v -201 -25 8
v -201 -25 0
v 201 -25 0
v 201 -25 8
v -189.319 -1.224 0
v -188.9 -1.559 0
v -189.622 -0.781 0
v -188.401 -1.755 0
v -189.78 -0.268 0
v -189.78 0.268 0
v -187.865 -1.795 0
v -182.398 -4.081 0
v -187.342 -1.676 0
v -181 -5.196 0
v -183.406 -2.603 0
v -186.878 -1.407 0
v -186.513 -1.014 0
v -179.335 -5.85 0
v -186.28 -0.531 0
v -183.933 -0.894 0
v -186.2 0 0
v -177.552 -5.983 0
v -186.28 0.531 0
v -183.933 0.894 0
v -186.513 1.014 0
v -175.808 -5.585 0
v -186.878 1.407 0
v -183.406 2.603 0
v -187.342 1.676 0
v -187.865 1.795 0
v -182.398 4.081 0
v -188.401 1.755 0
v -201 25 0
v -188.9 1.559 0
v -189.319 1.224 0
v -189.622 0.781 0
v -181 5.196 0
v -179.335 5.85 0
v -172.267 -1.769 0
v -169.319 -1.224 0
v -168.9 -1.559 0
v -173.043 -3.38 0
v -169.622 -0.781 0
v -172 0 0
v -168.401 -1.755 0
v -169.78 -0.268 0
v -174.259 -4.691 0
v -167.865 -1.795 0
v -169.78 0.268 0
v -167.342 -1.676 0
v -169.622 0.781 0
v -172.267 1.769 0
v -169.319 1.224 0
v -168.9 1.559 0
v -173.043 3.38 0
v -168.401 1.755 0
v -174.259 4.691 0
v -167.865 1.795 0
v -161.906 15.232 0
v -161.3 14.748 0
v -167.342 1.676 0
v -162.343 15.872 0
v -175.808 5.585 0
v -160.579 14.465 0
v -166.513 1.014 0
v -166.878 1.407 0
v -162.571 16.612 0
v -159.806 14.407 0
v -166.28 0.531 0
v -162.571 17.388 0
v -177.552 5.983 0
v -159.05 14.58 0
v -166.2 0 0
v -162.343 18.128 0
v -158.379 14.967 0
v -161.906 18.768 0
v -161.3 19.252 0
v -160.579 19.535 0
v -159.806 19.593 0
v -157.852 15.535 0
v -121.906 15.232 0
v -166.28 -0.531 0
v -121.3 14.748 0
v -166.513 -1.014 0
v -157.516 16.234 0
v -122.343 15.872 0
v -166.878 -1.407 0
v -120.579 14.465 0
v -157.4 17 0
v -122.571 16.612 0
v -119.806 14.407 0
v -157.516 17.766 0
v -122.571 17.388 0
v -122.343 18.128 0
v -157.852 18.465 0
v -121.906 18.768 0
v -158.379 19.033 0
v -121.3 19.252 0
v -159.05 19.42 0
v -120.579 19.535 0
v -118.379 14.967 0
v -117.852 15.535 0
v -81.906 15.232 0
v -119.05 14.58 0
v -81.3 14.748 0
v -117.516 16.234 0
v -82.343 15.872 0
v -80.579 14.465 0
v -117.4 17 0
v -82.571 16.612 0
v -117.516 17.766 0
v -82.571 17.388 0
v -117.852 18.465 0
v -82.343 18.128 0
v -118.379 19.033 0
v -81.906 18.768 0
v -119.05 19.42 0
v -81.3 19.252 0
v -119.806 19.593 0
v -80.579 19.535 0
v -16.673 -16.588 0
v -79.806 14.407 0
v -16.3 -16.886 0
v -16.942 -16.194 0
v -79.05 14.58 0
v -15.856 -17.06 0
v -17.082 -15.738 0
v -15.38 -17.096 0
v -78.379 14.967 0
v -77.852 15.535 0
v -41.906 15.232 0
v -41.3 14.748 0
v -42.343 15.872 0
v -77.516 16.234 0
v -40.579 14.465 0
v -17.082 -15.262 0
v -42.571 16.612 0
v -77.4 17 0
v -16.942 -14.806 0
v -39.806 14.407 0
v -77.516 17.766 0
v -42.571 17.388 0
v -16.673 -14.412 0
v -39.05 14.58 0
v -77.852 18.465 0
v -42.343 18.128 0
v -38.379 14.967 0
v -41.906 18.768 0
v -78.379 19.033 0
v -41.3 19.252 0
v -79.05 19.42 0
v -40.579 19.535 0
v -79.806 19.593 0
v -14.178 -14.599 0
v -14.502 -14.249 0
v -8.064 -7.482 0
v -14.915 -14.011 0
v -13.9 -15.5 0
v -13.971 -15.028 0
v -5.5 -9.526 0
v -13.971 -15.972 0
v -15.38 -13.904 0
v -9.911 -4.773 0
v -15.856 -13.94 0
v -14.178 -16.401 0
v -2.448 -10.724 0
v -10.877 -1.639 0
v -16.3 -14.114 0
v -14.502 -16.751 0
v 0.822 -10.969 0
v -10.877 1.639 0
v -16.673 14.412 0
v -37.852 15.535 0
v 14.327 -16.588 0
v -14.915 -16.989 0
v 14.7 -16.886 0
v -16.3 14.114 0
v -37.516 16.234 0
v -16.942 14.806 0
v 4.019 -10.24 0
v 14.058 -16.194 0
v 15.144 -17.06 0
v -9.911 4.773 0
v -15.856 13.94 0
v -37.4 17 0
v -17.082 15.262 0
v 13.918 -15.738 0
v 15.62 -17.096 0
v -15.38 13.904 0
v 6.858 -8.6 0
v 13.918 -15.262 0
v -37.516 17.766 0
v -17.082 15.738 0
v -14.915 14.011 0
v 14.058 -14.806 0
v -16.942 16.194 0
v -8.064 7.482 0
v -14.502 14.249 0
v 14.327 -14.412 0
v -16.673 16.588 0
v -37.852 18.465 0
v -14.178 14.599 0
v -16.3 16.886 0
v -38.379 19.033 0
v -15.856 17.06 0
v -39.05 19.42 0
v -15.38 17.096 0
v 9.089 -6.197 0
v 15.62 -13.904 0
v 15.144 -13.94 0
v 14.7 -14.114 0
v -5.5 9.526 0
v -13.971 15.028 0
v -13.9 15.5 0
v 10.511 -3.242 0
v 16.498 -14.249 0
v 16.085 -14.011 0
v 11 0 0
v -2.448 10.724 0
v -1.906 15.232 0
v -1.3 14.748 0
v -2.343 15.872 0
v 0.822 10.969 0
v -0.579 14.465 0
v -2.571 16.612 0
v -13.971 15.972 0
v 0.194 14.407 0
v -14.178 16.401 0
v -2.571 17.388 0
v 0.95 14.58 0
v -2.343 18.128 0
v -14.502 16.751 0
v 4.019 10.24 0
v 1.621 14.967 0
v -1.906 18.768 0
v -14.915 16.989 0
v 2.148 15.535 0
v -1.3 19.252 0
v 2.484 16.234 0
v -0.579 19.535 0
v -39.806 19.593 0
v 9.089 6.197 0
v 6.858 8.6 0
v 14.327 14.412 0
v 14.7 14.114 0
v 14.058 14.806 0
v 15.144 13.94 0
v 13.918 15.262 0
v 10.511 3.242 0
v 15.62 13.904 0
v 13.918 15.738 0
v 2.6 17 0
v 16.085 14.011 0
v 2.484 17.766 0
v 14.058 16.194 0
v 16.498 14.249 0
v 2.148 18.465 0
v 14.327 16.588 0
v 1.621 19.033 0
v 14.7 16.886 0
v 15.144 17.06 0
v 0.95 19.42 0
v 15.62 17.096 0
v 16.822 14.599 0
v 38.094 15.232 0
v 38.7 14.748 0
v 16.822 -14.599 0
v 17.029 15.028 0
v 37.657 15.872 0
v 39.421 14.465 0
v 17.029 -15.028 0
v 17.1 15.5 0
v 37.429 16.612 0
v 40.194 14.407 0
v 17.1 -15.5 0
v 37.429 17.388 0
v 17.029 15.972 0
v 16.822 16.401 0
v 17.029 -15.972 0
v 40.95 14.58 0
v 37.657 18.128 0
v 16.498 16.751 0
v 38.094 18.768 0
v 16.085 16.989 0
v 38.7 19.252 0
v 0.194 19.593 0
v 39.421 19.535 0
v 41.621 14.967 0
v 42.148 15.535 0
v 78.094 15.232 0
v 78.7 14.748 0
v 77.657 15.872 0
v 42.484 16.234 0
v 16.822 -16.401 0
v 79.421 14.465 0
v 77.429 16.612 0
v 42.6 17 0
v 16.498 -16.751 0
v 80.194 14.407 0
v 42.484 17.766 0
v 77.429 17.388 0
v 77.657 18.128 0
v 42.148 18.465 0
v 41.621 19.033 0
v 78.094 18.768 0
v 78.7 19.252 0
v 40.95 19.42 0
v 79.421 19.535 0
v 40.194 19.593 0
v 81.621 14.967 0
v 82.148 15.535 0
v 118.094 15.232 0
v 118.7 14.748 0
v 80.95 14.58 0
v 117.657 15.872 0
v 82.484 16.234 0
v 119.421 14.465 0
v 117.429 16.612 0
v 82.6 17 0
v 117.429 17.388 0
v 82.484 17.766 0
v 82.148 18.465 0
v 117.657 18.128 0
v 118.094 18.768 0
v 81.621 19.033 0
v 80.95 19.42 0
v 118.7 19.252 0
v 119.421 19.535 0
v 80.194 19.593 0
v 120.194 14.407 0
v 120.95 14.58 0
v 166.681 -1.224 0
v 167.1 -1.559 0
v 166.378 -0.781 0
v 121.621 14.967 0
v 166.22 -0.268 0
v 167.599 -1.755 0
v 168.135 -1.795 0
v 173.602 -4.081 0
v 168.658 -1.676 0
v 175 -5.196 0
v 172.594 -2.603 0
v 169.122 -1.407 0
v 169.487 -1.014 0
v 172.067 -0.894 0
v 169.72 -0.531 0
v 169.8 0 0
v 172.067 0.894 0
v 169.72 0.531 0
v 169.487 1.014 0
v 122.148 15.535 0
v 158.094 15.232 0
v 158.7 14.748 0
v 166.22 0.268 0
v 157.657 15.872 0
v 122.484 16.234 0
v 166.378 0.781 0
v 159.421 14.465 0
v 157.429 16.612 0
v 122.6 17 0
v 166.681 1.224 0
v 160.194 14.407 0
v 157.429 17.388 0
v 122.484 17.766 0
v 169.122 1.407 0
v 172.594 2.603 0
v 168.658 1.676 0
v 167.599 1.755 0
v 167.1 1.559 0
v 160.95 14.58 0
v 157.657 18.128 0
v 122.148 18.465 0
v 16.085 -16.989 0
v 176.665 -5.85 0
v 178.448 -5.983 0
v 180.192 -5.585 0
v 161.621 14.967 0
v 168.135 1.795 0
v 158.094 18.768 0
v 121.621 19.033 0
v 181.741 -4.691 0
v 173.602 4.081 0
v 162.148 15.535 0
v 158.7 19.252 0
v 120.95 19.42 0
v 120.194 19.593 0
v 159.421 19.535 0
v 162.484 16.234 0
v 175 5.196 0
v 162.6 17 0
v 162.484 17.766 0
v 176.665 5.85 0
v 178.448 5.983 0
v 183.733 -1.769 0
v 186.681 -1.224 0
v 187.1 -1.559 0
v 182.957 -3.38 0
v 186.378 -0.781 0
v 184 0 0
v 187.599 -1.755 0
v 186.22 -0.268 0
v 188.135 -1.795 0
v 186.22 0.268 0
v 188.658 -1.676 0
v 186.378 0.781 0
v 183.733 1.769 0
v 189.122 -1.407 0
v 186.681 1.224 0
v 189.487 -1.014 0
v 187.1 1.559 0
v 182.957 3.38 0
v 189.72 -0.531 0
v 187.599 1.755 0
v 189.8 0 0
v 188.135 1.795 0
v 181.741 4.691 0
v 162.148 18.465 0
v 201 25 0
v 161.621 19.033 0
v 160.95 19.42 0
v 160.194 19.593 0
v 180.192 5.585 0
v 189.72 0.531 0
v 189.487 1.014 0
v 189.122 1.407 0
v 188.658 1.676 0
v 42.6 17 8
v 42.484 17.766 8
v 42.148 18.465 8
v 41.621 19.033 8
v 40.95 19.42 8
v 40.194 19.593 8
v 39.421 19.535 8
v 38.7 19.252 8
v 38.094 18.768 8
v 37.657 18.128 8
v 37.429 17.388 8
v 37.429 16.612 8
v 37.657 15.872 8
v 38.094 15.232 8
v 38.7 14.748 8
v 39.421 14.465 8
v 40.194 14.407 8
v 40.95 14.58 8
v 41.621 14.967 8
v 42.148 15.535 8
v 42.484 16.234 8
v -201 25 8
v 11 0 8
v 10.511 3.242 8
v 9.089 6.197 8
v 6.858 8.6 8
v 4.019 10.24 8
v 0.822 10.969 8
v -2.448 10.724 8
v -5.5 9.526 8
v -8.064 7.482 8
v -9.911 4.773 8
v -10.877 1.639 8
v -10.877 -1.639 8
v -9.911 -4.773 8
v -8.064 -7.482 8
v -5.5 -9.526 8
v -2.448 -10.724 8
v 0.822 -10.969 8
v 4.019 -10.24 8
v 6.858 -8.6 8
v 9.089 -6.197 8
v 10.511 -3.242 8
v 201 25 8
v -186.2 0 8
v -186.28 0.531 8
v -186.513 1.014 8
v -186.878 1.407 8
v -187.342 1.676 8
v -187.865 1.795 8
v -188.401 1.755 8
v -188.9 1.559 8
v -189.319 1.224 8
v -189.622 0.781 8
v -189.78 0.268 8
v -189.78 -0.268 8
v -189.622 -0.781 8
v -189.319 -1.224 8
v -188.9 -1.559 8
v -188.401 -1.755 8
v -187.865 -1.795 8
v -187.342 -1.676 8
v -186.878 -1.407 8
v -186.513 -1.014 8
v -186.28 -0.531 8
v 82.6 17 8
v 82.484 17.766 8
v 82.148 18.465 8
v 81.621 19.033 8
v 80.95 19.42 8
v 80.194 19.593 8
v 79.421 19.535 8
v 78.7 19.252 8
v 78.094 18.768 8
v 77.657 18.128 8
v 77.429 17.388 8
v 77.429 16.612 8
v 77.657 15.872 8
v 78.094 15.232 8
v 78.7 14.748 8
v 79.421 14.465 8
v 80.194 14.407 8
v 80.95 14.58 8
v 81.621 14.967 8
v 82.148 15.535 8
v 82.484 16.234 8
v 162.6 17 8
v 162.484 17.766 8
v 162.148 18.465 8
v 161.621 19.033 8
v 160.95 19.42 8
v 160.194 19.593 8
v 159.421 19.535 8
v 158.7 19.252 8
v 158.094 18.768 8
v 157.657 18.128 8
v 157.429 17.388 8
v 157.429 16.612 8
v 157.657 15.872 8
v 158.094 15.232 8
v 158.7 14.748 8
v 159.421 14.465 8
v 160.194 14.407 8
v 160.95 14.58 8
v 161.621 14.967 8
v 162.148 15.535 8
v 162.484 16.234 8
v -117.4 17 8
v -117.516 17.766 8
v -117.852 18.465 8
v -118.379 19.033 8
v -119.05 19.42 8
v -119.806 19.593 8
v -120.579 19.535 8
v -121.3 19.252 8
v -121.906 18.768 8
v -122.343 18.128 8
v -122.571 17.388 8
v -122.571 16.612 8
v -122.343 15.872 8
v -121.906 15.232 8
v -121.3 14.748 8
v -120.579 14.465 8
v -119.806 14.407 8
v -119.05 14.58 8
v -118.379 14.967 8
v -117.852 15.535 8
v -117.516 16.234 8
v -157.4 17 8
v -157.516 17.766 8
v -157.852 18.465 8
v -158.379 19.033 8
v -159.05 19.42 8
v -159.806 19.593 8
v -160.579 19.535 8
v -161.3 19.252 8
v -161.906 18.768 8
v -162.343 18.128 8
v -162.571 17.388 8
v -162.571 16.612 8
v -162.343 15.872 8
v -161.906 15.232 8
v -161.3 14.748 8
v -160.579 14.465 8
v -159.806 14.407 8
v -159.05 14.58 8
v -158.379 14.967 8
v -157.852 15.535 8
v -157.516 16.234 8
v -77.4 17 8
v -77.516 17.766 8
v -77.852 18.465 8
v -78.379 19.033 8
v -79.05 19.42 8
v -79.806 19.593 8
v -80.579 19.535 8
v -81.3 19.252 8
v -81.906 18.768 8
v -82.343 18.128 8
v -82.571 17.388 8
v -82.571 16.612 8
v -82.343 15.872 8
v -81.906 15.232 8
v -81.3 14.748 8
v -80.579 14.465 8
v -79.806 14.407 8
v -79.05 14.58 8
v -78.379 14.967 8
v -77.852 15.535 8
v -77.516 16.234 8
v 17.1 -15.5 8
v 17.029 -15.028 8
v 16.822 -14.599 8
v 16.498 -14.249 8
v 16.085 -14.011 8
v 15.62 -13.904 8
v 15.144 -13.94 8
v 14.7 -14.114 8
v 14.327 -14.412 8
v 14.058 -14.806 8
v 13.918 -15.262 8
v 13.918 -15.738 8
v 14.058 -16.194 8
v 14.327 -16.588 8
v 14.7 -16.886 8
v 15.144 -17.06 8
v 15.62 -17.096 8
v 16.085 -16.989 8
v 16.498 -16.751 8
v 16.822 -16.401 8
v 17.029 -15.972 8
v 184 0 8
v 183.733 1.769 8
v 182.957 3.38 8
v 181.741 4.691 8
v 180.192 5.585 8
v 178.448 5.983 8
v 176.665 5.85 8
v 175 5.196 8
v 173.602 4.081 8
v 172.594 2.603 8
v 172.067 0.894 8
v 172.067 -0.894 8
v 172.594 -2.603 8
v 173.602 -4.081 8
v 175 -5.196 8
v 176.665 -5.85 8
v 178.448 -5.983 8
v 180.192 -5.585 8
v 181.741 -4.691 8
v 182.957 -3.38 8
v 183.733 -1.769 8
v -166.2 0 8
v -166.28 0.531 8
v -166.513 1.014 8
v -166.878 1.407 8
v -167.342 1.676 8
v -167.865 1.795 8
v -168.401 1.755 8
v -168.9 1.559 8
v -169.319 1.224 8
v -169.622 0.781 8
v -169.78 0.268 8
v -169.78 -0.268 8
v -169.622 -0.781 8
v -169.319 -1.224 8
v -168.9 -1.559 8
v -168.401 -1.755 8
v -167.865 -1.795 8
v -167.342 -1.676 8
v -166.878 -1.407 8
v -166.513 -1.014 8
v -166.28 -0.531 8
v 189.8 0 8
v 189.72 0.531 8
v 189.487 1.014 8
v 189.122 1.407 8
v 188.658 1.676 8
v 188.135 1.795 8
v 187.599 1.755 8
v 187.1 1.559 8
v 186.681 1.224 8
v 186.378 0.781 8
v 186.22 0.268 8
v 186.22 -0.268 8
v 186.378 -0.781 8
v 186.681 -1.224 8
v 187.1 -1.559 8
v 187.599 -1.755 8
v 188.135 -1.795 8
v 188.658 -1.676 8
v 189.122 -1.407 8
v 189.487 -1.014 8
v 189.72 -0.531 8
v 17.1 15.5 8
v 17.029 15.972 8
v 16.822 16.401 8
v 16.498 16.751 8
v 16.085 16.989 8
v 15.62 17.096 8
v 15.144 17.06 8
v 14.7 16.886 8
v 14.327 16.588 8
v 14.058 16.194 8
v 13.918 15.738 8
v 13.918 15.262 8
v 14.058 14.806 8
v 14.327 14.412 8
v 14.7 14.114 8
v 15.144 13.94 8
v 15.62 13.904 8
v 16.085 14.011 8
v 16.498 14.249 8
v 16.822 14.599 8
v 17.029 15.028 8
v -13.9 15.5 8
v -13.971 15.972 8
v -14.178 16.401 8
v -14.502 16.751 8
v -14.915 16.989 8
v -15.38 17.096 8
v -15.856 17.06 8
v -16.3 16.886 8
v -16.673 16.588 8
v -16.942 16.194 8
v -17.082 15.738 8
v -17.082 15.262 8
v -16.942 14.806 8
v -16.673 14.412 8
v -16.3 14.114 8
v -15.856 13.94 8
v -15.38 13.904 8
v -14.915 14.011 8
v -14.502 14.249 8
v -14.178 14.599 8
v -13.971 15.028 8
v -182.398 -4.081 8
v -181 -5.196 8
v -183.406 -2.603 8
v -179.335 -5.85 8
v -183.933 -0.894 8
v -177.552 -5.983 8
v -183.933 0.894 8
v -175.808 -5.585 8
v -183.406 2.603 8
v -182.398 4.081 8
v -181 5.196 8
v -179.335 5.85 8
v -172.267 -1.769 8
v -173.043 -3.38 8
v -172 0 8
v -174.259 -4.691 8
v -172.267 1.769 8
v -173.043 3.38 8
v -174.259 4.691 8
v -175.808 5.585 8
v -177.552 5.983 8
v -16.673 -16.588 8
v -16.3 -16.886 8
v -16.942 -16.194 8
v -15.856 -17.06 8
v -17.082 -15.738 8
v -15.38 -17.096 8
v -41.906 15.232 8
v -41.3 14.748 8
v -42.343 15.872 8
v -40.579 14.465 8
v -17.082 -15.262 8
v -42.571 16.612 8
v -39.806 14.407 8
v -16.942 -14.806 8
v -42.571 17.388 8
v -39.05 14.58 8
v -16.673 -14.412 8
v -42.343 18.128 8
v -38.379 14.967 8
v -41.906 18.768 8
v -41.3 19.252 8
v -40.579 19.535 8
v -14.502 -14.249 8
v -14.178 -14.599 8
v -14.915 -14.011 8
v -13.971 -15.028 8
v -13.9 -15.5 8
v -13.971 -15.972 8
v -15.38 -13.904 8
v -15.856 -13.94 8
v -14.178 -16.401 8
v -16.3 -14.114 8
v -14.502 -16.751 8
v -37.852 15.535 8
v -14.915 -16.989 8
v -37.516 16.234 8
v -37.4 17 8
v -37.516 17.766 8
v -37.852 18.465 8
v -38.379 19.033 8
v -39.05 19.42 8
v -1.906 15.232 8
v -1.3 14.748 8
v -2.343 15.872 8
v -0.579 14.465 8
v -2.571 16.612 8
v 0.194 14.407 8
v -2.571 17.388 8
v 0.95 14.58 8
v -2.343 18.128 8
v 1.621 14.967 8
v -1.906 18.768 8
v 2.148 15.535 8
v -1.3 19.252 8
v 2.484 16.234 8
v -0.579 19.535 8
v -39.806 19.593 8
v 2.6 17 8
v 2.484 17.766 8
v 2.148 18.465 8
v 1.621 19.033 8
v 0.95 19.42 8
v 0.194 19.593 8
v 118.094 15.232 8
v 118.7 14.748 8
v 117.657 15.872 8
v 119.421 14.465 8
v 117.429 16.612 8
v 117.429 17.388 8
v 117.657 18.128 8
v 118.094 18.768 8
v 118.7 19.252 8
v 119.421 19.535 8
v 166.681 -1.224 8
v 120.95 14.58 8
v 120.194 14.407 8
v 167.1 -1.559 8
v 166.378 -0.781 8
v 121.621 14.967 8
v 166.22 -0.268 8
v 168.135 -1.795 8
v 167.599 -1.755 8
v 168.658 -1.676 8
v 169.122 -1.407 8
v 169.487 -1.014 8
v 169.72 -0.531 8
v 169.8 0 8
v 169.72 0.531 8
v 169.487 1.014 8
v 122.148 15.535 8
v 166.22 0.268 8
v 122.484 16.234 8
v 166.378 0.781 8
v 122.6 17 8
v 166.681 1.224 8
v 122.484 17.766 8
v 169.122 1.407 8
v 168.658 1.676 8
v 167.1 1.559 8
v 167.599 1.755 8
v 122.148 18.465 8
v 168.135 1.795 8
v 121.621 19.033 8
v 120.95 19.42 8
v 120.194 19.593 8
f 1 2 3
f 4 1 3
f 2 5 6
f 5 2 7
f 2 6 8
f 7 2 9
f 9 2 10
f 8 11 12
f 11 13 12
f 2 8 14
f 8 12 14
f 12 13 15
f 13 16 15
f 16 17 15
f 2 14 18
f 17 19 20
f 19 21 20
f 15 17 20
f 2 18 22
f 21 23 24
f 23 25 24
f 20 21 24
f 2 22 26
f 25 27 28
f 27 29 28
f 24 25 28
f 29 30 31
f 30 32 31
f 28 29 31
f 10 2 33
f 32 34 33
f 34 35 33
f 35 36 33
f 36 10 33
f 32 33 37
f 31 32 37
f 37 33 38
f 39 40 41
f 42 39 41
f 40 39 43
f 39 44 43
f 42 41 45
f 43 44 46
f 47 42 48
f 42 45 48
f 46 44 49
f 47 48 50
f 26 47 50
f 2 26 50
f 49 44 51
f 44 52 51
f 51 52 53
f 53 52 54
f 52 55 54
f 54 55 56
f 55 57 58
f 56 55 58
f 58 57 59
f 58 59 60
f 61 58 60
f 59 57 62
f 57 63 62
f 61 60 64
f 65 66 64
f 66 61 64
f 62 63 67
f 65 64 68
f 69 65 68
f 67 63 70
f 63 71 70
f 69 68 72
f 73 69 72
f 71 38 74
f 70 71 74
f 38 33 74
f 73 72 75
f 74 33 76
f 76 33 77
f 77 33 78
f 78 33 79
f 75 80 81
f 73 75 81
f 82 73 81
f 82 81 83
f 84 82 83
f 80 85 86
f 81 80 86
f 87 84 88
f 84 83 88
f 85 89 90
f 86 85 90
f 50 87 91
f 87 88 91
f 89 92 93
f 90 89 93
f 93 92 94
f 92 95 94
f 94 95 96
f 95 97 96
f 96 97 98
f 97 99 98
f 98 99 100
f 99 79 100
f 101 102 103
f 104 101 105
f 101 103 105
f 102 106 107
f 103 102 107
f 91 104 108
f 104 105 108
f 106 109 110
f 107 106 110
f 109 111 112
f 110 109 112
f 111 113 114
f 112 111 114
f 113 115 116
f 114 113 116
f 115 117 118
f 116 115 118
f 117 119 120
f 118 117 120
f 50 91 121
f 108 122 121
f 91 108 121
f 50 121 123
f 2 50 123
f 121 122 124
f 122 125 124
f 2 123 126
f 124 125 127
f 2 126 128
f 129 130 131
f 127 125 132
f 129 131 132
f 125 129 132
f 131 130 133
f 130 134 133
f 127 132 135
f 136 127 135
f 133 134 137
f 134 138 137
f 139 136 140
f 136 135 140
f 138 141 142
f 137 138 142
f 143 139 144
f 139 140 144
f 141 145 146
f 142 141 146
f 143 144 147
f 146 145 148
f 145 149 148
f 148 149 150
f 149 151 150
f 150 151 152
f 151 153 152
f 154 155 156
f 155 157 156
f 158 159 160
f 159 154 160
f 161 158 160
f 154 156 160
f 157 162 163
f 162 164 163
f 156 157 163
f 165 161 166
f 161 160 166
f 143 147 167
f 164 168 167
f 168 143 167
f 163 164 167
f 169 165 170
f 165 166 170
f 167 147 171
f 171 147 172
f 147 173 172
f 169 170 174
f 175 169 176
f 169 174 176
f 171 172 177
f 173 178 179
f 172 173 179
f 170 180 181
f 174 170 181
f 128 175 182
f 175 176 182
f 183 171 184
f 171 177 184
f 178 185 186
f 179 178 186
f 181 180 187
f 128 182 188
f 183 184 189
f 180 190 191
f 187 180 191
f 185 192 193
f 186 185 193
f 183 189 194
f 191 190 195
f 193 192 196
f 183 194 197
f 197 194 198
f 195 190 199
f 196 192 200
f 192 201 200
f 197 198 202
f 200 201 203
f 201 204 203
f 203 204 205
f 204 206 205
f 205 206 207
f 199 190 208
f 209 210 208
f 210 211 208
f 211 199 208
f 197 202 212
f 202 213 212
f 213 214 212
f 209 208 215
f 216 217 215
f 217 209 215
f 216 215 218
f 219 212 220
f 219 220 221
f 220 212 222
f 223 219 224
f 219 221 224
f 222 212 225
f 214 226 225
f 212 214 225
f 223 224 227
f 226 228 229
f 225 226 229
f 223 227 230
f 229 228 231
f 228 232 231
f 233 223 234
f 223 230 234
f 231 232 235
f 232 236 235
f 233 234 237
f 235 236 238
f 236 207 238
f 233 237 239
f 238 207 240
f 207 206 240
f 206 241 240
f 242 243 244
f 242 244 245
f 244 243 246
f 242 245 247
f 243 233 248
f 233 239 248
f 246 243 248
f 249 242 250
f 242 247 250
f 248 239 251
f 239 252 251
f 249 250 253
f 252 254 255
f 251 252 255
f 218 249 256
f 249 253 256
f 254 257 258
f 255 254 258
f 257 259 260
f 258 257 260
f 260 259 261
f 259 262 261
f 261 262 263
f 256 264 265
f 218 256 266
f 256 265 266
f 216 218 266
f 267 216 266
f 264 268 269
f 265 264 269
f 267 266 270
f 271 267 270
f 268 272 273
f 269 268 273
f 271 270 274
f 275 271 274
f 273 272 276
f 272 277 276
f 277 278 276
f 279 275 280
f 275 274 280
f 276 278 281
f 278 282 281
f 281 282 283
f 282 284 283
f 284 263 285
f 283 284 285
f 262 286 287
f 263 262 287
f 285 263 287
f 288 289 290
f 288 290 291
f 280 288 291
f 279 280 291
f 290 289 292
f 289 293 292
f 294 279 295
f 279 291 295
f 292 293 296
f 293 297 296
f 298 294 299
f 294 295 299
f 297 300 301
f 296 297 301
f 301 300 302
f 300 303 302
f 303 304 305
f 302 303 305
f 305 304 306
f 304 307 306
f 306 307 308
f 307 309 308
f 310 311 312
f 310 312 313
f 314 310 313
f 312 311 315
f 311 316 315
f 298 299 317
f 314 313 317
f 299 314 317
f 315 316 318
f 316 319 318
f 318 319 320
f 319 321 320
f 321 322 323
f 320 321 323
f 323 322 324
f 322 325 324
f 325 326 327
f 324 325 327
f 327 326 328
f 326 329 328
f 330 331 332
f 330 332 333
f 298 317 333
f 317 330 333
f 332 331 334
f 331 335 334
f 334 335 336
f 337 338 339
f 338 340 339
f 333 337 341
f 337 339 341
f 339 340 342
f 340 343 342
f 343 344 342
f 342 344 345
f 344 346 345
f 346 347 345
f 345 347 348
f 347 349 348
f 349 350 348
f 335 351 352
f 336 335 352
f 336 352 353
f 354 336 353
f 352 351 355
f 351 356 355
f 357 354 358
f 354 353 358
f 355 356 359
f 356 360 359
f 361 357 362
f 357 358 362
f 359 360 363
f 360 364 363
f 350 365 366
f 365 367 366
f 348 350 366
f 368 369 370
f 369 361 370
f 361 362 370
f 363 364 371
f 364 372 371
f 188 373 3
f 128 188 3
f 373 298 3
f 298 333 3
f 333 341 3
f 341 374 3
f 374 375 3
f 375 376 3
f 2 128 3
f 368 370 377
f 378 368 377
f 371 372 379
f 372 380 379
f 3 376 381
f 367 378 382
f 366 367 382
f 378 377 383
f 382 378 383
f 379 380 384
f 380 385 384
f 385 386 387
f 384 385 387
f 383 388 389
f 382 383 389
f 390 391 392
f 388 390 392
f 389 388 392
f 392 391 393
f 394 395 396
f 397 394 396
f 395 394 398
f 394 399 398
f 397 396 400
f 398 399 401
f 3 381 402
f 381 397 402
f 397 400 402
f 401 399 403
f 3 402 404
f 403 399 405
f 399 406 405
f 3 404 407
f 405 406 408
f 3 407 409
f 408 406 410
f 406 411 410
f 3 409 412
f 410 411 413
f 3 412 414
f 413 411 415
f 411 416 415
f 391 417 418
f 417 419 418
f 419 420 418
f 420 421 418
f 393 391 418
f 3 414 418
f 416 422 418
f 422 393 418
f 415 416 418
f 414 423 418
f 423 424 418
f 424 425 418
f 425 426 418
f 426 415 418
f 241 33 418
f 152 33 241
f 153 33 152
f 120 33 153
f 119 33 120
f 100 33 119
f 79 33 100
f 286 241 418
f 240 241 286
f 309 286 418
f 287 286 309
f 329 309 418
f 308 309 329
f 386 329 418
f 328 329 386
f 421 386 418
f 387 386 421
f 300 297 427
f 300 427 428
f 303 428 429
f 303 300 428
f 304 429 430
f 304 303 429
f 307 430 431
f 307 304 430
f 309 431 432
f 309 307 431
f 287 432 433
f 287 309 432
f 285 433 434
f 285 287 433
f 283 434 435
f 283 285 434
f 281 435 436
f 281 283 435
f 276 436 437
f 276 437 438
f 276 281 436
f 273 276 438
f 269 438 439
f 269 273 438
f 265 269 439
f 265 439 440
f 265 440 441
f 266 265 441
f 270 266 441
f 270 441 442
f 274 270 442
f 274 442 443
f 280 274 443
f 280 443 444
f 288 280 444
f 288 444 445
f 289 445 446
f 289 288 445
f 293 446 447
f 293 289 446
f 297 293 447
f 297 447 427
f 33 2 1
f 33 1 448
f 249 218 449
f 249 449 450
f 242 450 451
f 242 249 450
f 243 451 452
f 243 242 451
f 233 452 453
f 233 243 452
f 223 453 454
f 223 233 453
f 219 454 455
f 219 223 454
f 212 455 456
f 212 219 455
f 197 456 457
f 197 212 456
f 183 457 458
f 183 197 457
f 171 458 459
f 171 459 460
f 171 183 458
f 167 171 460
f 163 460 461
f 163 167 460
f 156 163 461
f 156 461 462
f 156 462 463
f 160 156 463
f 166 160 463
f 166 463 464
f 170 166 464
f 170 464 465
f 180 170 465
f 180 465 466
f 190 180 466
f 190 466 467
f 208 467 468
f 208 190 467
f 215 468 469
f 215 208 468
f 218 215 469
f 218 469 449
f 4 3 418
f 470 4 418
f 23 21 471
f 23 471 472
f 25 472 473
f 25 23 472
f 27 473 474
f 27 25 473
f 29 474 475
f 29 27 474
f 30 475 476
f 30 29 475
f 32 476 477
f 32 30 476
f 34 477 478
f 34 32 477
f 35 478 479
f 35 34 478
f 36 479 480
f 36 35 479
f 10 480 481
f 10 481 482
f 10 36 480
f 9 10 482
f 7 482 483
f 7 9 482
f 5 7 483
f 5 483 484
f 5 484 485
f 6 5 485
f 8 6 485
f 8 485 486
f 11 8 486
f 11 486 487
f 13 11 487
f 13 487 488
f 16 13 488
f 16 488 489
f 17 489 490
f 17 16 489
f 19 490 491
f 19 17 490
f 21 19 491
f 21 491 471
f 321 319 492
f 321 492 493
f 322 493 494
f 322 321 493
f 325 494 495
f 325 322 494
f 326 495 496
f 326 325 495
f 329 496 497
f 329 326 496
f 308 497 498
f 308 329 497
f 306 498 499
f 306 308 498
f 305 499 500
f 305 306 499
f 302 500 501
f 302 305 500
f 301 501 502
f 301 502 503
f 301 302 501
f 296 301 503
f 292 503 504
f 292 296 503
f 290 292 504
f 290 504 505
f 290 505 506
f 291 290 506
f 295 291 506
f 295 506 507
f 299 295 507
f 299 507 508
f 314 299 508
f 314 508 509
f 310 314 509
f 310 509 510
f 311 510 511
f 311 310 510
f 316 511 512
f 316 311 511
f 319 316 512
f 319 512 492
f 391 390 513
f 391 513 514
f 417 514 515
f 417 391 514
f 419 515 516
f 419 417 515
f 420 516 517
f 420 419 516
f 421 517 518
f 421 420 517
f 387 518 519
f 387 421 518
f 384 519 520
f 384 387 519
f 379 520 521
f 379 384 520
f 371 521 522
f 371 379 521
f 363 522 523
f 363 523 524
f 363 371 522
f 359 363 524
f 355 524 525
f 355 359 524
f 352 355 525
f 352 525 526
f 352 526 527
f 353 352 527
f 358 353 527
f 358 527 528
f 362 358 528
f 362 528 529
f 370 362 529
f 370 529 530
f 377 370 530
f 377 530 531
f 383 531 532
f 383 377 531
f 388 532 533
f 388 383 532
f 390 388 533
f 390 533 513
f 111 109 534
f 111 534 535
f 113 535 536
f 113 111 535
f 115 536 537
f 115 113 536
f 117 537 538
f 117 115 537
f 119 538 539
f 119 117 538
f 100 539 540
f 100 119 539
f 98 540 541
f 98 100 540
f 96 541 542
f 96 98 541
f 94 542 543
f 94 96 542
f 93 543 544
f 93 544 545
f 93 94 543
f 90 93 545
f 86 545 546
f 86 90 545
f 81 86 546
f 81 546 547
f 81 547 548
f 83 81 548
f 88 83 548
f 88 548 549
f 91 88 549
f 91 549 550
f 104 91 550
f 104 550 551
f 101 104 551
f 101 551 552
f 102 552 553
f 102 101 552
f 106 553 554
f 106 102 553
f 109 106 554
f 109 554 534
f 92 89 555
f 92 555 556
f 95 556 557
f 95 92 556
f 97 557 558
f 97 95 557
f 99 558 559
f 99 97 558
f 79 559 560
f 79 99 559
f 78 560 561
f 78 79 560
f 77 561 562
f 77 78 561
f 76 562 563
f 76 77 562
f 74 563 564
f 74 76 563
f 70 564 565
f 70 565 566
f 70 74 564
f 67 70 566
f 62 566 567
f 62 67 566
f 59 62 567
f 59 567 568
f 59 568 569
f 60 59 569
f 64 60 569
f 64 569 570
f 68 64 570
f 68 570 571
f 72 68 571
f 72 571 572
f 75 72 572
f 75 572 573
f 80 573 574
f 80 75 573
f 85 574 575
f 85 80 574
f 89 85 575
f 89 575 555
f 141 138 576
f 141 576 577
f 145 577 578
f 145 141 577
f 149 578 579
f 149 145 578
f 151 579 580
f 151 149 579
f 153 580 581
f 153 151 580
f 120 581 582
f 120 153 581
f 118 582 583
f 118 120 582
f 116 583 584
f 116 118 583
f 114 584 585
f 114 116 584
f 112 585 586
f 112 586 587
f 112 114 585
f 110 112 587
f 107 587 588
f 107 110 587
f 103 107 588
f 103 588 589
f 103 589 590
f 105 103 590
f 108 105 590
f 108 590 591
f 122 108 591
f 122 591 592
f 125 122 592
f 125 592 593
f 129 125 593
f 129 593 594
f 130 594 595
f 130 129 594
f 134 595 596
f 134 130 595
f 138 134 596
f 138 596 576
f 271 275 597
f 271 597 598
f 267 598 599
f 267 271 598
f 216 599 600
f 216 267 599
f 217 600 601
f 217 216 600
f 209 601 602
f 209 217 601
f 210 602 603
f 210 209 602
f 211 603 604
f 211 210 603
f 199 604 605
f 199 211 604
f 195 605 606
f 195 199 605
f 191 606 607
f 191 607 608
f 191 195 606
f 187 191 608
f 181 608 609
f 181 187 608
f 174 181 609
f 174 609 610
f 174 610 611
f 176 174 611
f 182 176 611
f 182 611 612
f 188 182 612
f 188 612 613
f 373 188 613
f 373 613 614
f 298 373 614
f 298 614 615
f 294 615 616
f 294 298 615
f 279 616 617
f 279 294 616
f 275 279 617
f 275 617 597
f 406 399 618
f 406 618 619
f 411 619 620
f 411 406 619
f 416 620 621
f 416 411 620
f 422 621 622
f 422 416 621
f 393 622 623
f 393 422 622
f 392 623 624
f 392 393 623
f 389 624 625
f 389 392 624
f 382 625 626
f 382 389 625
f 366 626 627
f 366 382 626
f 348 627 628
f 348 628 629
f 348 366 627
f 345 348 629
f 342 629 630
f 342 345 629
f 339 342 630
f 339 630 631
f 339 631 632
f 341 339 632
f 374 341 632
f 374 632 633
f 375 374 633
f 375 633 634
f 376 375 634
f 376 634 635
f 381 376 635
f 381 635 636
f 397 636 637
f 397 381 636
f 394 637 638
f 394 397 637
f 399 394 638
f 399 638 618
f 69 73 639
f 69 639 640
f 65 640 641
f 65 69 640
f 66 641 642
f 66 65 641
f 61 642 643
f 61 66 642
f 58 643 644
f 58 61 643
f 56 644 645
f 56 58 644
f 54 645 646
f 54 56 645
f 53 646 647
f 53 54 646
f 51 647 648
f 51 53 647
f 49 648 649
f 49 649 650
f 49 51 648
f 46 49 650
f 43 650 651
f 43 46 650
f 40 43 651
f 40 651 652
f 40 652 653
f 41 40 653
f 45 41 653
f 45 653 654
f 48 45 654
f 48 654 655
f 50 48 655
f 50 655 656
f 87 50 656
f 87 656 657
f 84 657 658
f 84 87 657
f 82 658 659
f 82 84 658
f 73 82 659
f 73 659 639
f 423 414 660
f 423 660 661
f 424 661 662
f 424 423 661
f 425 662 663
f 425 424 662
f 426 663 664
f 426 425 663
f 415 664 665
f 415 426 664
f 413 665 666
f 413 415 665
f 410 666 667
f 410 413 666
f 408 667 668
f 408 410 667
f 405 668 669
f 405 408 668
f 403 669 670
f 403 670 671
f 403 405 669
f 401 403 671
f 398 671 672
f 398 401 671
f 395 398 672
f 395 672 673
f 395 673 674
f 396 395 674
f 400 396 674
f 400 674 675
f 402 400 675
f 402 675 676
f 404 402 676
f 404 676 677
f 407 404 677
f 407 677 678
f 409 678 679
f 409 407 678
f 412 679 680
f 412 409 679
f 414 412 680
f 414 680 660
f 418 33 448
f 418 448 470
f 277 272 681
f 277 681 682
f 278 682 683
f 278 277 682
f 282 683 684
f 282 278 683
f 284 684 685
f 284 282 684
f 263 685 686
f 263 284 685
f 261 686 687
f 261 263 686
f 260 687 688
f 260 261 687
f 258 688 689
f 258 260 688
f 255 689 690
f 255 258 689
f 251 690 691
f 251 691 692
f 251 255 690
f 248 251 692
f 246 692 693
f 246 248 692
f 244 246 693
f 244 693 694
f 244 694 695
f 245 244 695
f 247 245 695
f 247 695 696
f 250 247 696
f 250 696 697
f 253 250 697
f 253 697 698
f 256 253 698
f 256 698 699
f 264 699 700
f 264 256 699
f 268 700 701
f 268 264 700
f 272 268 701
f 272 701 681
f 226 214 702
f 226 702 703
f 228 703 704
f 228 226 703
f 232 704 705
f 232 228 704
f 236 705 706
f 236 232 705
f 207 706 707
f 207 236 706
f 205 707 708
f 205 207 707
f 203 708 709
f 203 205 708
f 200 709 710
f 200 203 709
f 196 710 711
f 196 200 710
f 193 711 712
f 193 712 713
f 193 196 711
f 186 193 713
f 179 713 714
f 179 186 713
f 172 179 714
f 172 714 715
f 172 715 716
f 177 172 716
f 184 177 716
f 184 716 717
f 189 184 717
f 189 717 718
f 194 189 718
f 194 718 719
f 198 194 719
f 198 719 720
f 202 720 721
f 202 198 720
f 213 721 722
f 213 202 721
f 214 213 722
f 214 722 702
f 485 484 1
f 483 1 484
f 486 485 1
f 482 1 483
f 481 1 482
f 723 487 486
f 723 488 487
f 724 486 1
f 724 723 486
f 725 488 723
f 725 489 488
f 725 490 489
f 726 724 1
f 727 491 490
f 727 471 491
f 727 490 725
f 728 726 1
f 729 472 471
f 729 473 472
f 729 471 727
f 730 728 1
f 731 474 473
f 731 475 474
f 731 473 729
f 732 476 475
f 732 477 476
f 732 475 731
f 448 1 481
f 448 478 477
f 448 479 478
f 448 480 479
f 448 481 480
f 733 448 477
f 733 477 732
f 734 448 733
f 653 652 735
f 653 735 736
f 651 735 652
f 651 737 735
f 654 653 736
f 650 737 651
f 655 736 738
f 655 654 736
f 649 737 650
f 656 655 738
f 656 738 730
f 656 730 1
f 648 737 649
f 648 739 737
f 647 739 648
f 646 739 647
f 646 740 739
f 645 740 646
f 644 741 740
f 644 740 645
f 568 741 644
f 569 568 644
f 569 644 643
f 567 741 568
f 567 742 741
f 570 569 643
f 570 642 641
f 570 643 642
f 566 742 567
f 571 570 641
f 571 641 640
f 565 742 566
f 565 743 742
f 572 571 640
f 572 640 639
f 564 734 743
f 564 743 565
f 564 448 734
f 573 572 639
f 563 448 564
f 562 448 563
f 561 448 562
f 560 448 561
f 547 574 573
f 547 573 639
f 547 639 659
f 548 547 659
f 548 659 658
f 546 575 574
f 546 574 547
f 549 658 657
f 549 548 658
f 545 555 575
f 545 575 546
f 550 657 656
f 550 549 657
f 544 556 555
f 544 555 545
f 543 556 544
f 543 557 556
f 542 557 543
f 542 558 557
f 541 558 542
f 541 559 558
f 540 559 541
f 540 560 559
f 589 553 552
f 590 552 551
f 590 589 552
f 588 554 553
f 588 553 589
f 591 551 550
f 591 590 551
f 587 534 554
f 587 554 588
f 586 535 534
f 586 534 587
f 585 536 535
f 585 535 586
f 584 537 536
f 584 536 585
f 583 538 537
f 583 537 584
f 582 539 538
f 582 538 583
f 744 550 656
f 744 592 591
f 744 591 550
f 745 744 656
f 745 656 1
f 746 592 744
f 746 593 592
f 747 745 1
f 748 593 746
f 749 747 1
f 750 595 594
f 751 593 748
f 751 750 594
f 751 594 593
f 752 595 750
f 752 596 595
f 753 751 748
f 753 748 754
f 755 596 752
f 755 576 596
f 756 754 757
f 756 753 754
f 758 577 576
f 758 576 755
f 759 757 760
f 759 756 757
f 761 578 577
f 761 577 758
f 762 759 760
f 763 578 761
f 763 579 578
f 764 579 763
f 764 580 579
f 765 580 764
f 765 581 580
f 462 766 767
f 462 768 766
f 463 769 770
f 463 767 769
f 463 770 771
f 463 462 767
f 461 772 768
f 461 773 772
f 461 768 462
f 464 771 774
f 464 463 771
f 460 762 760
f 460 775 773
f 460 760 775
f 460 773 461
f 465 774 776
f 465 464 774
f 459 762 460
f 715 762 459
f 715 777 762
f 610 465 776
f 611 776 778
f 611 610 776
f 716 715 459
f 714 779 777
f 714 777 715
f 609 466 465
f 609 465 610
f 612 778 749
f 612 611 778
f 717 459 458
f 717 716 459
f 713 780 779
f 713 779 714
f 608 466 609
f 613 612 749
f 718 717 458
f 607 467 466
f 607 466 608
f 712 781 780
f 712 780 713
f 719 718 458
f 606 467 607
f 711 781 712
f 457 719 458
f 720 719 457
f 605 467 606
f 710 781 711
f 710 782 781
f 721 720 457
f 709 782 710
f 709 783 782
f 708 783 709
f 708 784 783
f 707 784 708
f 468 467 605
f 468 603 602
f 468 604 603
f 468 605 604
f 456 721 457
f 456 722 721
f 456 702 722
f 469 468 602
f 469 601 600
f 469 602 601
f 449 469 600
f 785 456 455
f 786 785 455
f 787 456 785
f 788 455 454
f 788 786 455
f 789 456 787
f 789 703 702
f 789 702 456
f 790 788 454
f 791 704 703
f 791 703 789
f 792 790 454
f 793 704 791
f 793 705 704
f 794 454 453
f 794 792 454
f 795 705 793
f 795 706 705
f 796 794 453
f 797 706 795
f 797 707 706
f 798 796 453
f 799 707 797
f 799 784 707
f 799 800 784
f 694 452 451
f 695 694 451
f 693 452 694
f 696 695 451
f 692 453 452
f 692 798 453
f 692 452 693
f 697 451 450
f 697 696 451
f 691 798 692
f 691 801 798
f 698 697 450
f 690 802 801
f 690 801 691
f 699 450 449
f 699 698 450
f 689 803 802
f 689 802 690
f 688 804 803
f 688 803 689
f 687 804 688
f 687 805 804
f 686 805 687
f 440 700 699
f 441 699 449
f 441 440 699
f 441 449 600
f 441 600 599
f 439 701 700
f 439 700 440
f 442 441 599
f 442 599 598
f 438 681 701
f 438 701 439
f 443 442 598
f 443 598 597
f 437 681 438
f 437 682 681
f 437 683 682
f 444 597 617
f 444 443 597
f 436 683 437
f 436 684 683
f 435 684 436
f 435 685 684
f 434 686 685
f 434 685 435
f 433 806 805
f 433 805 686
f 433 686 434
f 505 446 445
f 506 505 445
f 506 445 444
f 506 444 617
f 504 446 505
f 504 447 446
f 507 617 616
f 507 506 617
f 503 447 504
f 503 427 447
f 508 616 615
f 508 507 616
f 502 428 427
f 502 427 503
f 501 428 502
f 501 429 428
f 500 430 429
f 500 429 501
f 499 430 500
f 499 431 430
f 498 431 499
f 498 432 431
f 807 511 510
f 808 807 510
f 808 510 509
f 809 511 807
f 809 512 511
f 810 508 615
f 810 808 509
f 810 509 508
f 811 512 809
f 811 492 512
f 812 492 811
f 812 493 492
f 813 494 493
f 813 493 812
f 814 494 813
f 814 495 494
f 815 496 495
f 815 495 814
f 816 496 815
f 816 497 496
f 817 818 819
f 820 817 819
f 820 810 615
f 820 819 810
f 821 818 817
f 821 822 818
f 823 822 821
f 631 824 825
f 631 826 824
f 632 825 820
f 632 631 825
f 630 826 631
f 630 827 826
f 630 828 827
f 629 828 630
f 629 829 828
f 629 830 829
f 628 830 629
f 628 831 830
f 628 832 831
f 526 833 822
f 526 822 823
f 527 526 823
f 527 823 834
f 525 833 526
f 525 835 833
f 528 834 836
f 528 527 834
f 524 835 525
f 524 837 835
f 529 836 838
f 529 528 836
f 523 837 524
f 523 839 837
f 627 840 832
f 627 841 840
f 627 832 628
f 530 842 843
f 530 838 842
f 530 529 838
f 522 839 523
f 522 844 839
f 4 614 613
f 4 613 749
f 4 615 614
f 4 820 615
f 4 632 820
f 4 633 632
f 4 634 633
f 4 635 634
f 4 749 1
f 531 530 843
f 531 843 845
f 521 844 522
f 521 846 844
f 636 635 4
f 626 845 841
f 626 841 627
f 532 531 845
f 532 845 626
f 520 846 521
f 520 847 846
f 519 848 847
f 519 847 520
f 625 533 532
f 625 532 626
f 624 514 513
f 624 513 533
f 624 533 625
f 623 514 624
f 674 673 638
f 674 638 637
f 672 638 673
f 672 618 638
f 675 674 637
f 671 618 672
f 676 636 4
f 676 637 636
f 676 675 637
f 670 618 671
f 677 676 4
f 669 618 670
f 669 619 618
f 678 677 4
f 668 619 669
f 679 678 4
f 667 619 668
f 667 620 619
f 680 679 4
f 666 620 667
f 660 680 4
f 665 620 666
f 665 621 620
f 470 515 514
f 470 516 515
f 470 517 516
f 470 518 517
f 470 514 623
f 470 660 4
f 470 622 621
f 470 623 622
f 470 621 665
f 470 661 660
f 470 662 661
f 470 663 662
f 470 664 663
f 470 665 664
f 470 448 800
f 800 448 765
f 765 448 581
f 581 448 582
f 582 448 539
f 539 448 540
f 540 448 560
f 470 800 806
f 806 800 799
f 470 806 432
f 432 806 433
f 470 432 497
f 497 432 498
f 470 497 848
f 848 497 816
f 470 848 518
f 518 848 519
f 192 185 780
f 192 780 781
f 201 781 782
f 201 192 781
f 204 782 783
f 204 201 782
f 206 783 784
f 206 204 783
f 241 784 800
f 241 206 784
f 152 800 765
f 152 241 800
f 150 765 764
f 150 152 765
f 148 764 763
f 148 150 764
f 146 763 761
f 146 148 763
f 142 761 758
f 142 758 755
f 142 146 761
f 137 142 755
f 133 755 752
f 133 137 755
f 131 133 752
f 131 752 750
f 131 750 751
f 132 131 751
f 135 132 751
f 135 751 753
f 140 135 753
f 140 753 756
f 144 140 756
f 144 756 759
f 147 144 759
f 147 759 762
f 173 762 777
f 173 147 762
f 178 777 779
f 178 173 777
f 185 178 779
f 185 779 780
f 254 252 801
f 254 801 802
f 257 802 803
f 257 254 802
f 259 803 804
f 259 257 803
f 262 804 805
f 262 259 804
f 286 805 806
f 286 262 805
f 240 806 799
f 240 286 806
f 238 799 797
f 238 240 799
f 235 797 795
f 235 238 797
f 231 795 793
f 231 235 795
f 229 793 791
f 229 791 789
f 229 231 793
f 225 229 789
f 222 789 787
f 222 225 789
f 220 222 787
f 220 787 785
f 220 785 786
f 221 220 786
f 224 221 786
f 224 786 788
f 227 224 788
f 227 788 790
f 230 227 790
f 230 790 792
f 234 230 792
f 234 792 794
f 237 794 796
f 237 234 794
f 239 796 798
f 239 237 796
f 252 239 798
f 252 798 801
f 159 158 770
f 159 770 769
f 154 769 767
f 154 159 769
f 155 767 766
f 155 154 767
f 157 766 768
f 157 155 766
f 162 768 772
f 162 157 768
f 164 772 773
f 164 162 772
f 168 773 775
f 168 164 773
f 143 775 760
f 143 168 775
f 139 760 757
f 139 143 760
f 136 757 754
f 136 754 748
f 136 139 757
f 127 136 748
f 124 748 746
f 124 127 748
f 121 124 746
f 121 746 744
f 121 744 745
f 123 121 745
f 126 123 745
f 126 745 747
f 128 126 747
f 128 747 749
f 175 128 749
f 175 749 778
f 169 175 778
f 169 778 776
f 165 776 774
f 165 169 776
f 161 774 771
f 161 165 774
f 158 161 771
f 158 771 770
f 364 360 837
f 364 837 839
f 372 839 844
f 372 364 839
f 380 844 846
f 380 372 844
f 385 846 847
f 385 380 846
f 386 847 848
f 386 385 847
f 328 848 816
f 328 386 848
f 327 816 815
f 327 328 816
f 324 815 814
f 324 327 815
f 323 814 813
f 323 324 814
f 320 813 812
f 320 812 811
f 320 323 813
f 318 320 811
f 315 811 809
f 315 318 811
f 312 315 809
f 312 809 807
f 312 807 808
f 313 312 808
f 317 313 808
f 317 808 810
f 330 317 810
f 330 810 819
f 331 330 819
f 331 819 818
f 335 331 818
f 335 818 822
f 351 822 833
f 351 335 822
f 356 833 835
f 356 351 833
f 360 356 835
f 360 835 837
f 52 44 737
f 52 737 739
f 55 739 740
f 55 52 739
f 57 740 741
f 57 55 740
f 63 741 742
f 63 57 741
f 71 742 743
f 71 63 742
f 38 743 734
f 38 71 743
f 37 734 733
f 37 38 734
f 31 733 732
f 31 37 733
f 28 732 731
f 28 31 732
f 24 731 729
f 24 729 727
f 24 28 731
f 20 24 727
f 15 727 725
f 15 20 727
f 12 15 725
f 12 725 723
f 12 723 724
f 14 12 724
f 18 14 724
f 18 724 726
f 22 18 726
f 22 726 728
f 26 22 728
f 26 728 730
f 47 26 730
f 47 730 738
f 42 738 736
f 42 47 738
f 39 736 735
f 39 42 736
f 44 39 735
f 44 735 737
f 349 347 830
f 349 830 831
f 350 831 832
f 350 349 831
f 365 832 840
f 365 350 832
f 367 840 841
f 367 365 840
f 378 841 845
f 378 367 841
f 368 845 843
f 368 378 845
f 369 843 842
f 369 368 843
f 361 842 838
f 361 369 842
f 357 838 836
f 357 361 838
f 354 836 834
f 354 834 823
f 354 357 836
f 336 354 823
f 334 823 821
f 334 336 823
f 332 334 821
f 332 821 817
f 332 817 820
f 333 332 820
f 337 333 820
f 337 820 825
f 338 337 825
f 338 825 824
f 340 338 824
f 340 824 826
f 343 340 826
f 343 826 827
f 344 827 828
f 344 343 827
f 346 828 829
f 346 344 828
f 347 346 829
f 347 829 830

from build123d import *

# Parameters (mm, degrees)
SKETCH1_W           = 402
SKETCH1_H           = 50
SKETCH1_R           = 6
SKETCH1_R_2         = 1.8
SKETCH1_R_3         = 11
SKETCH1_R_4         = 1.6
SKETCH1_R_5         = 2.6
BOSS_EXTRUDE1_DEPTH = 8


with BuildPart() as part:
    # Sketch1 → Boss-Extrude1 (new body)
    with BuildSketch(Plane.XY):
        Rectangle(SKETCH1_W, SKETCH1_H)
        with Locations((-178, 0)):
            Circle(SKETCH1_R, mode=Mode.SUBTRACT)
        with Locations((168, 0)):
            Circle(SKETCH1_R_2, mode=Mode.SUBTRACT)
        Circle(SKETCH1_R_3, mode=Mode.SUBTRACT)
        with Locations((-188, 0)):
            Circle(SKETCH1_R_2, mode=Mode.SUBTRACT)
        with Locations((-168, 0)):
            Circle(SKETCH1_R_2, mode=Mode.SUBTRACT)
        with Locations((188, 0)):
            Circle(SKETCH1_R_2, mode=Mode.SUBTRACT)
        with Locations((178, 0)):
            Circle(SKETCH1_R, mode=Mode.SUBTRACT)
        with Locations((-15.5, 15.5)):
            Circle(SKETCH1_R_4, mode=Mode.SUBTRACT)
        with Locations((15.5, 15.5)):
            Circle(SKETCH1_R_4, mode=Mode.SUBTRACT)
        with Locations((-15.5, -15.5)):
            Circle(SKETCH1_R_4, mode=Mode.SUBTRACT)
        with Locations((15.5, -15.5)):
            Circle(SKETCH1_R_4, mode=Mode.SUBTRACT)
        with Locations((0, 17)):
            Circle(SKETCH1_R_5, mode=Mode.SUBTRACT)
        with Locations((40, 17)):
            Circle(SKETCH1_R_5, mode=Mode.SUBTRACT)
        with Locations((80, 17)):
            Circle(SKETCH1_R_5, mode=Mode.SUBTRACT)
        with Locations((120, 17)):
            Circle(SKETCH1_R_5, mode=Mode.SUBTRACT)
        with Locations((160, 17)):
            Circle(SKETCH1_R_5, mode=Mode.SUBTRACT)
        with Locations((-40, 17)):
            Circle(SKETCH1_R_5, mode=Mode.SUBTRACT)
        with Locations((-80, 17)):
            Circle(SKETCH1_R_5, mode=Mode.SUBTRACT)
        with Locations((-120, 17)):
            Circle(SKETCH1_R_5, mode=Mode.SUBTRACT)
        with Locations((-160, 17)):
            Circle(SKETCH1_R_5, mode=Mode.SUBTRACT)
    extrude(amount=BOSS_EXTRUDE1_DEPTH)


solid = part.part
